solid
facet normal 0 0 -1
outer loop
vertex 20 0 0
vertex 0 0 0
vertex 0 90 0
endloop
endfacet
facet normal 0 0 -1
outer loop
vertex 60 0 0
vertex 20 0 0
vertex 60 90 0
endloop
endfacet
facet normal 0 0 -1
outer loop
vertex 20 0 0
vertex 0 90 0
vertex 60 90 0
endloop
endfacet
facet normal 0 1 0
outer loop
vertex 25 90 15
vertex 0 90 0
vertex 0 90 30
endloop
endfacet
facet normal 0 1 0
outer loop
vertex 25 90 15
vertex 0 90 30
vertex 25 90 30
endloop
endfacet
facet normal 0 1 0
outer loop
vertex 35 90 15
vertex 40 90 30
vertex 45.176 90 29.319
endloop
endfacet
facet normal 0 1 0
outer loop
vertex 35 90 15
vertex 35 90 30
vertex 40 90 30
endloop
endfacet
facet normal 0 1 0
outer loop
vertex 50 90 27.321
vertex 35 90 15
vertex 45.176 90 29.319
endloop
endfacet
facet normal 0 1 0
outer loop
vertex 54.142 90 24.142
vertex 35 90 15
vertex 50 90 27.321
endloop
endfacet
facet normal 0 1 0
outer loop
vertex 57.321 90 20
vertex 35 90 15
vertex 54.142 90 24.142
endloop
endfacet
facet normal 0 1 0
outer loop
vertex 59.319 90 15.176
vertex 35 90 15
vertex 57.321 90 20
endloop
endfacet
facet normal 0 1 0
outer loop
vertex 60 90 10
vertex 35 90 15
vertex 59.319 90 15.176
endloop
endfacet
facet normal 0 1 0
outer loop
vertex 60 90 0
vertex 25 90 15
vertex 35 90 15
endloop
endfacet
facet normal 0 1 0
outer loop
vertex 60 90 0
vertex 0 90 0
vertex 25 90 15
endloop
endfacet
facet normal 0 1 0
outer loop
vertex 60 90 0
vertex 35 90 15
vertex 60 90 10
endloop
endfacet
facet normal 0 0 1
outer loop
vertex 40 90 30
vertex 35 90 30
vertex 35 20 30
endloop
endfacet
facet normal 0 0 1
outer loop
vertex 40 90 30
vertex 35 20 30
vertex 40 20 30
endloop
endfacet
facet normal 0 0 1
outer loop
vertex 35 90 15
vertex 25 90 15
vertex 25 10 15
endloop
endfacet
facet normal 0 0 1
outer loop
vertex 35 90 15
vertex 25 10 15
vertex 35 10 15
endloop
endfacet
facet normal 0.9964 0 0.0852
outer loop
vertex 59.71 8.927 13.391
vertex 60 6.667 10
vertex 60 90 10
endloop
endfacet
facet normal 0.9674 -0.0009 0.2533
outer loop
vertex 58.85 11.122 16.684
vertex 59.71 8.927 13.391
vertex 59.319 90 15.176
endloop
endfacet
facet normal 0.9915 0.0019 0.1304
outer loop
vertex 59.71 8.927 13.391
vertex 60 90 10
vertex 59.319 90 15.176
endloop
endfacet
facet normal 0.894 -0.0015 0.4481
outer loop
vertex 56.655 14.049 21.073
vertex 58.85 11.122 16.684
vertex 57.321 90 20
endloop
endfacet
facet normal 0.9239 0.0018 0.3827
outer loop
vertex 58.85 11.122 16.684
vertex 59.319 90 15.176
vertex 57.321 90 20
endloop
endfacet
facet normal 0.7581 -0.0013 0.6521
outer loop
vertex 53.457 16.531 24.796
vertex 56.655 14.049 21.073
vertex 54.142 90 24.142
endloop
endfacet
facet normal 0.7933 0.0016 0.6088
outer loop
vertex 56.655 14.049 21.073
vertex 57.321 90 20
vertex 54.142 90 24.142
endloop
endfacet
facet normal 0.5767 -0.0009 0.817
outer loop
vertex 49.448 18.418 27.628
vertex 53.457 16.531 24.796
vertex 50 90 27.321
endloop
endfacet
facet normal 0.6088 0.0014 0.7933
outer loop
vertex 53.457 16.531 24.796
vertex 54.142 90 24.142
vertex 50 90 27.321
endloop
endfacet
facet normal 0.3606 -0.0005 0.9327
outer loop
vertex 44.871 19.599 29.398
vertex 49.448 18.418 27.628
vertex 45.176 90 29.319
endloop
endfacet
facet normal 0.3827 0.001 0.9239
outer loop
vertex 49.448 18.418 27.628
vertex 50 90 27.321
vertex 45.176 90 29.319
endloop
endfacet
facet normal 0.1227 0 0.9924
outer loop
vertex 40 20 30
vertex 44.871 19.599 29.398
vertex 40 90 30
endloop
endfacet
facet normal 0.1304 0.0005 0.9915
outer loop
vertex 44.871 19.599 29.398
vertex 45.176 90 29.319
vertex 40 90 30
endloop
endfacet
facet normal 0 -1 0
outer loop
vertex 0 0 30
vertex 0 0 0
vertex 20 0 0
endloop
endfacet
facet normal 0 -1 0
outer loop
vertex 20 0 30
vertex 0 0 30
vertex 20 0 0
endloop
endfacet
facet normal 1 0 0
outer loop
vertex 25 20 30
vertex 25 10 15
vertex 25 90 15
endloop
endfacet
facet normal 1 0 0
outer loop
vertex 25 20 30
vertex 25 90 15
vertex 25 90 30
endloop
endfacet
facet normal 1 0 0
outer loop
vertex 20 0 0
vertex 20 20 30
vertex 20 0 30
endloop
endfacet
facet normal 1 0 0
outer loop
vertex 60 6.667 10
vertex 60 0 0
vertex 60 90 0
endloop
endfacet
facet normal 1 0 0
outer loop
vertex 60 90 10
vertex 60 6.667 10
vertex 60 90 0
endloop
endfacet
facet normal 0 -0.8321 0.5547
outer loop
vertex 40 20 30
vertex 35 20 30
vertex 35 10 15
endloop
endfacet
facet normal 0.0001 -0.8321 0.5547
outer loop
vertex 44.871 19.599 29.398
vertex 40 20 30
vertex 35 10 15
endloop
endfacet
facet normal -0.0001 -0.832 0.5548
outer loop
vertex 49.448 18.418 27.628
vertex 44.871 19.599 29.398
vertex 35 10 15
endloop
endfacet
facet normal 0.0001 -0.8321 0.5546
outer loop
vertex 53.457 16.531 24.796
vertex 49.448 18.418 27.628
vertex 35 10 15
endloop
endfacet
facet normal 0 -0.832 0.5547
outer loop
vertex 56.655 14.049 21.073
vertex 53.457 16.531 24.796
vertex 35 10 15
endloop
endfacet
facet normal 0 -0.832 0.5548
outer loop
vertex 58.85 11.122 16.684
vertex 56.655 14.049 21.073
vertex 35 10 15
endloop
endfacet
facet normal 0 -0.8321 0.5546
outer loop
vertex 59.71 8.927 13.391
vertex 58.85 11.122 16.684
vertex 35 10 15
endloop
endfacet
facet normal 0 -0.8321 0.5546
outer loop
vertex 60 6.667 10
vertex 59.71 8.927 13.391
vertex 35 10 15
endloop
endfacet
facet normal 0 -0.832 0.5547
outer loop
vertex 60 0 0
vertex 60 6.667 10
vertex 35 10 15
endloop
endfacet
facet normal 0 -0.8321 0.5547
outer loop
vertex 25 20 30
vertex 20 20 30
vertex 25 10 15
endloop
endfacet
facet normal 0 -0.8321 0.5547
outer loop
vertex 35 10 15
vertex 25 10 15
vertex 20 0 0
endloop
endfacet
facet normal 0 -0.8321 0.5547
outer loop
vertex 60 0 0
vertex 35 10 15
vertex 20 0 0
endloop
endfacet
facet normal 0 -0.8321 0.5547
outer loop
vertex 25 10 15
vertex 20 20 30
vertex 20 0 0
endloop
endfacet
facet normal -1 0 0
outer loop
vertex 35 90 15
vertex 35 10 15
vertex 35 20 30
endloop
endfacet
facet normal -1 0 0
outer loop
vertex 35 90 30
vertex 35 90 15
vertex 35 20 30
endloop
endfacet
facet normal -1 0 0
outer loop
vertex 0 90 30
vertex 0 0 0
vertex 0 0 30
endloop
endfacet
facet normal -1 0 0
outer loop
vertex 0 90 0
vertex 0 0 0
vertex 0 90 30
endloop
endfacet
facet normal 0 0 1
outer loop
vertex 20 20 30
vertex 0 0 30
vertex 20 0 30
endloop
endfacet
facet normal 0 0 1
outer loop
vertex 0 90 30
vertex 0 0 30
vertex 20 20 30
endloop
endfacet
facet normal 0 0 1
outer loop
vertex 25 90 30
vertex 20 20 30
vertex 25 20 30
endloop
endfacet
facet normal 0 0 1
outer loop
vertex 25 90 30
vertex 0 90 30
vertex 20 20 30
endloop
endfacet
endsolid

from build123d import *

# Parameters (mm, degrees)
F0_W     = 60
F0_H     = 90
F1_DEPTH = 30
F2_R     = 20
F3_W     = 10
F3_H     = 15
F4_DEPTH = 90.001
F7_DEPTH = 40.001


with BuildPart() as f1:
    # F0 (on Top) → F1 (new body)
    with BuildSketch(Plane.XY):
        with Locations((30, 45)):
            Rectangle(F0_W, F0_H)
    extrude(amount=F1_DEPTH)

    # F2
    f2_edges = [f1.edges().sort_by_distance(p)[0] for p in [
        (60, 45, 30),
    ]]
    fillet(f2_edges, radius=F2_R)

    # F3 (on face) → F4 (cut, through all)
    with BuildSketch(Plane.XZ):
        with Locations((30, 22.5)):
            Rectangle(F3_W, F3_H)
    extrude(amount=-F4_DEPTH, mode=Mode.SUBTRACT)

    # F6 (on offset) → F7 (cut, through all)
    with BuildSketch(Plane(origin=(20, 0, 0), x_dir=(0, -1, 0), z_dir=(-1, 0, 0))):
        Polygon((-20, 30), (0, 0), (0, 30), align=None)
    extrude(amount=-F7_DEPTH, mode=Mode.SUBTRACT)


solid = f1.part
